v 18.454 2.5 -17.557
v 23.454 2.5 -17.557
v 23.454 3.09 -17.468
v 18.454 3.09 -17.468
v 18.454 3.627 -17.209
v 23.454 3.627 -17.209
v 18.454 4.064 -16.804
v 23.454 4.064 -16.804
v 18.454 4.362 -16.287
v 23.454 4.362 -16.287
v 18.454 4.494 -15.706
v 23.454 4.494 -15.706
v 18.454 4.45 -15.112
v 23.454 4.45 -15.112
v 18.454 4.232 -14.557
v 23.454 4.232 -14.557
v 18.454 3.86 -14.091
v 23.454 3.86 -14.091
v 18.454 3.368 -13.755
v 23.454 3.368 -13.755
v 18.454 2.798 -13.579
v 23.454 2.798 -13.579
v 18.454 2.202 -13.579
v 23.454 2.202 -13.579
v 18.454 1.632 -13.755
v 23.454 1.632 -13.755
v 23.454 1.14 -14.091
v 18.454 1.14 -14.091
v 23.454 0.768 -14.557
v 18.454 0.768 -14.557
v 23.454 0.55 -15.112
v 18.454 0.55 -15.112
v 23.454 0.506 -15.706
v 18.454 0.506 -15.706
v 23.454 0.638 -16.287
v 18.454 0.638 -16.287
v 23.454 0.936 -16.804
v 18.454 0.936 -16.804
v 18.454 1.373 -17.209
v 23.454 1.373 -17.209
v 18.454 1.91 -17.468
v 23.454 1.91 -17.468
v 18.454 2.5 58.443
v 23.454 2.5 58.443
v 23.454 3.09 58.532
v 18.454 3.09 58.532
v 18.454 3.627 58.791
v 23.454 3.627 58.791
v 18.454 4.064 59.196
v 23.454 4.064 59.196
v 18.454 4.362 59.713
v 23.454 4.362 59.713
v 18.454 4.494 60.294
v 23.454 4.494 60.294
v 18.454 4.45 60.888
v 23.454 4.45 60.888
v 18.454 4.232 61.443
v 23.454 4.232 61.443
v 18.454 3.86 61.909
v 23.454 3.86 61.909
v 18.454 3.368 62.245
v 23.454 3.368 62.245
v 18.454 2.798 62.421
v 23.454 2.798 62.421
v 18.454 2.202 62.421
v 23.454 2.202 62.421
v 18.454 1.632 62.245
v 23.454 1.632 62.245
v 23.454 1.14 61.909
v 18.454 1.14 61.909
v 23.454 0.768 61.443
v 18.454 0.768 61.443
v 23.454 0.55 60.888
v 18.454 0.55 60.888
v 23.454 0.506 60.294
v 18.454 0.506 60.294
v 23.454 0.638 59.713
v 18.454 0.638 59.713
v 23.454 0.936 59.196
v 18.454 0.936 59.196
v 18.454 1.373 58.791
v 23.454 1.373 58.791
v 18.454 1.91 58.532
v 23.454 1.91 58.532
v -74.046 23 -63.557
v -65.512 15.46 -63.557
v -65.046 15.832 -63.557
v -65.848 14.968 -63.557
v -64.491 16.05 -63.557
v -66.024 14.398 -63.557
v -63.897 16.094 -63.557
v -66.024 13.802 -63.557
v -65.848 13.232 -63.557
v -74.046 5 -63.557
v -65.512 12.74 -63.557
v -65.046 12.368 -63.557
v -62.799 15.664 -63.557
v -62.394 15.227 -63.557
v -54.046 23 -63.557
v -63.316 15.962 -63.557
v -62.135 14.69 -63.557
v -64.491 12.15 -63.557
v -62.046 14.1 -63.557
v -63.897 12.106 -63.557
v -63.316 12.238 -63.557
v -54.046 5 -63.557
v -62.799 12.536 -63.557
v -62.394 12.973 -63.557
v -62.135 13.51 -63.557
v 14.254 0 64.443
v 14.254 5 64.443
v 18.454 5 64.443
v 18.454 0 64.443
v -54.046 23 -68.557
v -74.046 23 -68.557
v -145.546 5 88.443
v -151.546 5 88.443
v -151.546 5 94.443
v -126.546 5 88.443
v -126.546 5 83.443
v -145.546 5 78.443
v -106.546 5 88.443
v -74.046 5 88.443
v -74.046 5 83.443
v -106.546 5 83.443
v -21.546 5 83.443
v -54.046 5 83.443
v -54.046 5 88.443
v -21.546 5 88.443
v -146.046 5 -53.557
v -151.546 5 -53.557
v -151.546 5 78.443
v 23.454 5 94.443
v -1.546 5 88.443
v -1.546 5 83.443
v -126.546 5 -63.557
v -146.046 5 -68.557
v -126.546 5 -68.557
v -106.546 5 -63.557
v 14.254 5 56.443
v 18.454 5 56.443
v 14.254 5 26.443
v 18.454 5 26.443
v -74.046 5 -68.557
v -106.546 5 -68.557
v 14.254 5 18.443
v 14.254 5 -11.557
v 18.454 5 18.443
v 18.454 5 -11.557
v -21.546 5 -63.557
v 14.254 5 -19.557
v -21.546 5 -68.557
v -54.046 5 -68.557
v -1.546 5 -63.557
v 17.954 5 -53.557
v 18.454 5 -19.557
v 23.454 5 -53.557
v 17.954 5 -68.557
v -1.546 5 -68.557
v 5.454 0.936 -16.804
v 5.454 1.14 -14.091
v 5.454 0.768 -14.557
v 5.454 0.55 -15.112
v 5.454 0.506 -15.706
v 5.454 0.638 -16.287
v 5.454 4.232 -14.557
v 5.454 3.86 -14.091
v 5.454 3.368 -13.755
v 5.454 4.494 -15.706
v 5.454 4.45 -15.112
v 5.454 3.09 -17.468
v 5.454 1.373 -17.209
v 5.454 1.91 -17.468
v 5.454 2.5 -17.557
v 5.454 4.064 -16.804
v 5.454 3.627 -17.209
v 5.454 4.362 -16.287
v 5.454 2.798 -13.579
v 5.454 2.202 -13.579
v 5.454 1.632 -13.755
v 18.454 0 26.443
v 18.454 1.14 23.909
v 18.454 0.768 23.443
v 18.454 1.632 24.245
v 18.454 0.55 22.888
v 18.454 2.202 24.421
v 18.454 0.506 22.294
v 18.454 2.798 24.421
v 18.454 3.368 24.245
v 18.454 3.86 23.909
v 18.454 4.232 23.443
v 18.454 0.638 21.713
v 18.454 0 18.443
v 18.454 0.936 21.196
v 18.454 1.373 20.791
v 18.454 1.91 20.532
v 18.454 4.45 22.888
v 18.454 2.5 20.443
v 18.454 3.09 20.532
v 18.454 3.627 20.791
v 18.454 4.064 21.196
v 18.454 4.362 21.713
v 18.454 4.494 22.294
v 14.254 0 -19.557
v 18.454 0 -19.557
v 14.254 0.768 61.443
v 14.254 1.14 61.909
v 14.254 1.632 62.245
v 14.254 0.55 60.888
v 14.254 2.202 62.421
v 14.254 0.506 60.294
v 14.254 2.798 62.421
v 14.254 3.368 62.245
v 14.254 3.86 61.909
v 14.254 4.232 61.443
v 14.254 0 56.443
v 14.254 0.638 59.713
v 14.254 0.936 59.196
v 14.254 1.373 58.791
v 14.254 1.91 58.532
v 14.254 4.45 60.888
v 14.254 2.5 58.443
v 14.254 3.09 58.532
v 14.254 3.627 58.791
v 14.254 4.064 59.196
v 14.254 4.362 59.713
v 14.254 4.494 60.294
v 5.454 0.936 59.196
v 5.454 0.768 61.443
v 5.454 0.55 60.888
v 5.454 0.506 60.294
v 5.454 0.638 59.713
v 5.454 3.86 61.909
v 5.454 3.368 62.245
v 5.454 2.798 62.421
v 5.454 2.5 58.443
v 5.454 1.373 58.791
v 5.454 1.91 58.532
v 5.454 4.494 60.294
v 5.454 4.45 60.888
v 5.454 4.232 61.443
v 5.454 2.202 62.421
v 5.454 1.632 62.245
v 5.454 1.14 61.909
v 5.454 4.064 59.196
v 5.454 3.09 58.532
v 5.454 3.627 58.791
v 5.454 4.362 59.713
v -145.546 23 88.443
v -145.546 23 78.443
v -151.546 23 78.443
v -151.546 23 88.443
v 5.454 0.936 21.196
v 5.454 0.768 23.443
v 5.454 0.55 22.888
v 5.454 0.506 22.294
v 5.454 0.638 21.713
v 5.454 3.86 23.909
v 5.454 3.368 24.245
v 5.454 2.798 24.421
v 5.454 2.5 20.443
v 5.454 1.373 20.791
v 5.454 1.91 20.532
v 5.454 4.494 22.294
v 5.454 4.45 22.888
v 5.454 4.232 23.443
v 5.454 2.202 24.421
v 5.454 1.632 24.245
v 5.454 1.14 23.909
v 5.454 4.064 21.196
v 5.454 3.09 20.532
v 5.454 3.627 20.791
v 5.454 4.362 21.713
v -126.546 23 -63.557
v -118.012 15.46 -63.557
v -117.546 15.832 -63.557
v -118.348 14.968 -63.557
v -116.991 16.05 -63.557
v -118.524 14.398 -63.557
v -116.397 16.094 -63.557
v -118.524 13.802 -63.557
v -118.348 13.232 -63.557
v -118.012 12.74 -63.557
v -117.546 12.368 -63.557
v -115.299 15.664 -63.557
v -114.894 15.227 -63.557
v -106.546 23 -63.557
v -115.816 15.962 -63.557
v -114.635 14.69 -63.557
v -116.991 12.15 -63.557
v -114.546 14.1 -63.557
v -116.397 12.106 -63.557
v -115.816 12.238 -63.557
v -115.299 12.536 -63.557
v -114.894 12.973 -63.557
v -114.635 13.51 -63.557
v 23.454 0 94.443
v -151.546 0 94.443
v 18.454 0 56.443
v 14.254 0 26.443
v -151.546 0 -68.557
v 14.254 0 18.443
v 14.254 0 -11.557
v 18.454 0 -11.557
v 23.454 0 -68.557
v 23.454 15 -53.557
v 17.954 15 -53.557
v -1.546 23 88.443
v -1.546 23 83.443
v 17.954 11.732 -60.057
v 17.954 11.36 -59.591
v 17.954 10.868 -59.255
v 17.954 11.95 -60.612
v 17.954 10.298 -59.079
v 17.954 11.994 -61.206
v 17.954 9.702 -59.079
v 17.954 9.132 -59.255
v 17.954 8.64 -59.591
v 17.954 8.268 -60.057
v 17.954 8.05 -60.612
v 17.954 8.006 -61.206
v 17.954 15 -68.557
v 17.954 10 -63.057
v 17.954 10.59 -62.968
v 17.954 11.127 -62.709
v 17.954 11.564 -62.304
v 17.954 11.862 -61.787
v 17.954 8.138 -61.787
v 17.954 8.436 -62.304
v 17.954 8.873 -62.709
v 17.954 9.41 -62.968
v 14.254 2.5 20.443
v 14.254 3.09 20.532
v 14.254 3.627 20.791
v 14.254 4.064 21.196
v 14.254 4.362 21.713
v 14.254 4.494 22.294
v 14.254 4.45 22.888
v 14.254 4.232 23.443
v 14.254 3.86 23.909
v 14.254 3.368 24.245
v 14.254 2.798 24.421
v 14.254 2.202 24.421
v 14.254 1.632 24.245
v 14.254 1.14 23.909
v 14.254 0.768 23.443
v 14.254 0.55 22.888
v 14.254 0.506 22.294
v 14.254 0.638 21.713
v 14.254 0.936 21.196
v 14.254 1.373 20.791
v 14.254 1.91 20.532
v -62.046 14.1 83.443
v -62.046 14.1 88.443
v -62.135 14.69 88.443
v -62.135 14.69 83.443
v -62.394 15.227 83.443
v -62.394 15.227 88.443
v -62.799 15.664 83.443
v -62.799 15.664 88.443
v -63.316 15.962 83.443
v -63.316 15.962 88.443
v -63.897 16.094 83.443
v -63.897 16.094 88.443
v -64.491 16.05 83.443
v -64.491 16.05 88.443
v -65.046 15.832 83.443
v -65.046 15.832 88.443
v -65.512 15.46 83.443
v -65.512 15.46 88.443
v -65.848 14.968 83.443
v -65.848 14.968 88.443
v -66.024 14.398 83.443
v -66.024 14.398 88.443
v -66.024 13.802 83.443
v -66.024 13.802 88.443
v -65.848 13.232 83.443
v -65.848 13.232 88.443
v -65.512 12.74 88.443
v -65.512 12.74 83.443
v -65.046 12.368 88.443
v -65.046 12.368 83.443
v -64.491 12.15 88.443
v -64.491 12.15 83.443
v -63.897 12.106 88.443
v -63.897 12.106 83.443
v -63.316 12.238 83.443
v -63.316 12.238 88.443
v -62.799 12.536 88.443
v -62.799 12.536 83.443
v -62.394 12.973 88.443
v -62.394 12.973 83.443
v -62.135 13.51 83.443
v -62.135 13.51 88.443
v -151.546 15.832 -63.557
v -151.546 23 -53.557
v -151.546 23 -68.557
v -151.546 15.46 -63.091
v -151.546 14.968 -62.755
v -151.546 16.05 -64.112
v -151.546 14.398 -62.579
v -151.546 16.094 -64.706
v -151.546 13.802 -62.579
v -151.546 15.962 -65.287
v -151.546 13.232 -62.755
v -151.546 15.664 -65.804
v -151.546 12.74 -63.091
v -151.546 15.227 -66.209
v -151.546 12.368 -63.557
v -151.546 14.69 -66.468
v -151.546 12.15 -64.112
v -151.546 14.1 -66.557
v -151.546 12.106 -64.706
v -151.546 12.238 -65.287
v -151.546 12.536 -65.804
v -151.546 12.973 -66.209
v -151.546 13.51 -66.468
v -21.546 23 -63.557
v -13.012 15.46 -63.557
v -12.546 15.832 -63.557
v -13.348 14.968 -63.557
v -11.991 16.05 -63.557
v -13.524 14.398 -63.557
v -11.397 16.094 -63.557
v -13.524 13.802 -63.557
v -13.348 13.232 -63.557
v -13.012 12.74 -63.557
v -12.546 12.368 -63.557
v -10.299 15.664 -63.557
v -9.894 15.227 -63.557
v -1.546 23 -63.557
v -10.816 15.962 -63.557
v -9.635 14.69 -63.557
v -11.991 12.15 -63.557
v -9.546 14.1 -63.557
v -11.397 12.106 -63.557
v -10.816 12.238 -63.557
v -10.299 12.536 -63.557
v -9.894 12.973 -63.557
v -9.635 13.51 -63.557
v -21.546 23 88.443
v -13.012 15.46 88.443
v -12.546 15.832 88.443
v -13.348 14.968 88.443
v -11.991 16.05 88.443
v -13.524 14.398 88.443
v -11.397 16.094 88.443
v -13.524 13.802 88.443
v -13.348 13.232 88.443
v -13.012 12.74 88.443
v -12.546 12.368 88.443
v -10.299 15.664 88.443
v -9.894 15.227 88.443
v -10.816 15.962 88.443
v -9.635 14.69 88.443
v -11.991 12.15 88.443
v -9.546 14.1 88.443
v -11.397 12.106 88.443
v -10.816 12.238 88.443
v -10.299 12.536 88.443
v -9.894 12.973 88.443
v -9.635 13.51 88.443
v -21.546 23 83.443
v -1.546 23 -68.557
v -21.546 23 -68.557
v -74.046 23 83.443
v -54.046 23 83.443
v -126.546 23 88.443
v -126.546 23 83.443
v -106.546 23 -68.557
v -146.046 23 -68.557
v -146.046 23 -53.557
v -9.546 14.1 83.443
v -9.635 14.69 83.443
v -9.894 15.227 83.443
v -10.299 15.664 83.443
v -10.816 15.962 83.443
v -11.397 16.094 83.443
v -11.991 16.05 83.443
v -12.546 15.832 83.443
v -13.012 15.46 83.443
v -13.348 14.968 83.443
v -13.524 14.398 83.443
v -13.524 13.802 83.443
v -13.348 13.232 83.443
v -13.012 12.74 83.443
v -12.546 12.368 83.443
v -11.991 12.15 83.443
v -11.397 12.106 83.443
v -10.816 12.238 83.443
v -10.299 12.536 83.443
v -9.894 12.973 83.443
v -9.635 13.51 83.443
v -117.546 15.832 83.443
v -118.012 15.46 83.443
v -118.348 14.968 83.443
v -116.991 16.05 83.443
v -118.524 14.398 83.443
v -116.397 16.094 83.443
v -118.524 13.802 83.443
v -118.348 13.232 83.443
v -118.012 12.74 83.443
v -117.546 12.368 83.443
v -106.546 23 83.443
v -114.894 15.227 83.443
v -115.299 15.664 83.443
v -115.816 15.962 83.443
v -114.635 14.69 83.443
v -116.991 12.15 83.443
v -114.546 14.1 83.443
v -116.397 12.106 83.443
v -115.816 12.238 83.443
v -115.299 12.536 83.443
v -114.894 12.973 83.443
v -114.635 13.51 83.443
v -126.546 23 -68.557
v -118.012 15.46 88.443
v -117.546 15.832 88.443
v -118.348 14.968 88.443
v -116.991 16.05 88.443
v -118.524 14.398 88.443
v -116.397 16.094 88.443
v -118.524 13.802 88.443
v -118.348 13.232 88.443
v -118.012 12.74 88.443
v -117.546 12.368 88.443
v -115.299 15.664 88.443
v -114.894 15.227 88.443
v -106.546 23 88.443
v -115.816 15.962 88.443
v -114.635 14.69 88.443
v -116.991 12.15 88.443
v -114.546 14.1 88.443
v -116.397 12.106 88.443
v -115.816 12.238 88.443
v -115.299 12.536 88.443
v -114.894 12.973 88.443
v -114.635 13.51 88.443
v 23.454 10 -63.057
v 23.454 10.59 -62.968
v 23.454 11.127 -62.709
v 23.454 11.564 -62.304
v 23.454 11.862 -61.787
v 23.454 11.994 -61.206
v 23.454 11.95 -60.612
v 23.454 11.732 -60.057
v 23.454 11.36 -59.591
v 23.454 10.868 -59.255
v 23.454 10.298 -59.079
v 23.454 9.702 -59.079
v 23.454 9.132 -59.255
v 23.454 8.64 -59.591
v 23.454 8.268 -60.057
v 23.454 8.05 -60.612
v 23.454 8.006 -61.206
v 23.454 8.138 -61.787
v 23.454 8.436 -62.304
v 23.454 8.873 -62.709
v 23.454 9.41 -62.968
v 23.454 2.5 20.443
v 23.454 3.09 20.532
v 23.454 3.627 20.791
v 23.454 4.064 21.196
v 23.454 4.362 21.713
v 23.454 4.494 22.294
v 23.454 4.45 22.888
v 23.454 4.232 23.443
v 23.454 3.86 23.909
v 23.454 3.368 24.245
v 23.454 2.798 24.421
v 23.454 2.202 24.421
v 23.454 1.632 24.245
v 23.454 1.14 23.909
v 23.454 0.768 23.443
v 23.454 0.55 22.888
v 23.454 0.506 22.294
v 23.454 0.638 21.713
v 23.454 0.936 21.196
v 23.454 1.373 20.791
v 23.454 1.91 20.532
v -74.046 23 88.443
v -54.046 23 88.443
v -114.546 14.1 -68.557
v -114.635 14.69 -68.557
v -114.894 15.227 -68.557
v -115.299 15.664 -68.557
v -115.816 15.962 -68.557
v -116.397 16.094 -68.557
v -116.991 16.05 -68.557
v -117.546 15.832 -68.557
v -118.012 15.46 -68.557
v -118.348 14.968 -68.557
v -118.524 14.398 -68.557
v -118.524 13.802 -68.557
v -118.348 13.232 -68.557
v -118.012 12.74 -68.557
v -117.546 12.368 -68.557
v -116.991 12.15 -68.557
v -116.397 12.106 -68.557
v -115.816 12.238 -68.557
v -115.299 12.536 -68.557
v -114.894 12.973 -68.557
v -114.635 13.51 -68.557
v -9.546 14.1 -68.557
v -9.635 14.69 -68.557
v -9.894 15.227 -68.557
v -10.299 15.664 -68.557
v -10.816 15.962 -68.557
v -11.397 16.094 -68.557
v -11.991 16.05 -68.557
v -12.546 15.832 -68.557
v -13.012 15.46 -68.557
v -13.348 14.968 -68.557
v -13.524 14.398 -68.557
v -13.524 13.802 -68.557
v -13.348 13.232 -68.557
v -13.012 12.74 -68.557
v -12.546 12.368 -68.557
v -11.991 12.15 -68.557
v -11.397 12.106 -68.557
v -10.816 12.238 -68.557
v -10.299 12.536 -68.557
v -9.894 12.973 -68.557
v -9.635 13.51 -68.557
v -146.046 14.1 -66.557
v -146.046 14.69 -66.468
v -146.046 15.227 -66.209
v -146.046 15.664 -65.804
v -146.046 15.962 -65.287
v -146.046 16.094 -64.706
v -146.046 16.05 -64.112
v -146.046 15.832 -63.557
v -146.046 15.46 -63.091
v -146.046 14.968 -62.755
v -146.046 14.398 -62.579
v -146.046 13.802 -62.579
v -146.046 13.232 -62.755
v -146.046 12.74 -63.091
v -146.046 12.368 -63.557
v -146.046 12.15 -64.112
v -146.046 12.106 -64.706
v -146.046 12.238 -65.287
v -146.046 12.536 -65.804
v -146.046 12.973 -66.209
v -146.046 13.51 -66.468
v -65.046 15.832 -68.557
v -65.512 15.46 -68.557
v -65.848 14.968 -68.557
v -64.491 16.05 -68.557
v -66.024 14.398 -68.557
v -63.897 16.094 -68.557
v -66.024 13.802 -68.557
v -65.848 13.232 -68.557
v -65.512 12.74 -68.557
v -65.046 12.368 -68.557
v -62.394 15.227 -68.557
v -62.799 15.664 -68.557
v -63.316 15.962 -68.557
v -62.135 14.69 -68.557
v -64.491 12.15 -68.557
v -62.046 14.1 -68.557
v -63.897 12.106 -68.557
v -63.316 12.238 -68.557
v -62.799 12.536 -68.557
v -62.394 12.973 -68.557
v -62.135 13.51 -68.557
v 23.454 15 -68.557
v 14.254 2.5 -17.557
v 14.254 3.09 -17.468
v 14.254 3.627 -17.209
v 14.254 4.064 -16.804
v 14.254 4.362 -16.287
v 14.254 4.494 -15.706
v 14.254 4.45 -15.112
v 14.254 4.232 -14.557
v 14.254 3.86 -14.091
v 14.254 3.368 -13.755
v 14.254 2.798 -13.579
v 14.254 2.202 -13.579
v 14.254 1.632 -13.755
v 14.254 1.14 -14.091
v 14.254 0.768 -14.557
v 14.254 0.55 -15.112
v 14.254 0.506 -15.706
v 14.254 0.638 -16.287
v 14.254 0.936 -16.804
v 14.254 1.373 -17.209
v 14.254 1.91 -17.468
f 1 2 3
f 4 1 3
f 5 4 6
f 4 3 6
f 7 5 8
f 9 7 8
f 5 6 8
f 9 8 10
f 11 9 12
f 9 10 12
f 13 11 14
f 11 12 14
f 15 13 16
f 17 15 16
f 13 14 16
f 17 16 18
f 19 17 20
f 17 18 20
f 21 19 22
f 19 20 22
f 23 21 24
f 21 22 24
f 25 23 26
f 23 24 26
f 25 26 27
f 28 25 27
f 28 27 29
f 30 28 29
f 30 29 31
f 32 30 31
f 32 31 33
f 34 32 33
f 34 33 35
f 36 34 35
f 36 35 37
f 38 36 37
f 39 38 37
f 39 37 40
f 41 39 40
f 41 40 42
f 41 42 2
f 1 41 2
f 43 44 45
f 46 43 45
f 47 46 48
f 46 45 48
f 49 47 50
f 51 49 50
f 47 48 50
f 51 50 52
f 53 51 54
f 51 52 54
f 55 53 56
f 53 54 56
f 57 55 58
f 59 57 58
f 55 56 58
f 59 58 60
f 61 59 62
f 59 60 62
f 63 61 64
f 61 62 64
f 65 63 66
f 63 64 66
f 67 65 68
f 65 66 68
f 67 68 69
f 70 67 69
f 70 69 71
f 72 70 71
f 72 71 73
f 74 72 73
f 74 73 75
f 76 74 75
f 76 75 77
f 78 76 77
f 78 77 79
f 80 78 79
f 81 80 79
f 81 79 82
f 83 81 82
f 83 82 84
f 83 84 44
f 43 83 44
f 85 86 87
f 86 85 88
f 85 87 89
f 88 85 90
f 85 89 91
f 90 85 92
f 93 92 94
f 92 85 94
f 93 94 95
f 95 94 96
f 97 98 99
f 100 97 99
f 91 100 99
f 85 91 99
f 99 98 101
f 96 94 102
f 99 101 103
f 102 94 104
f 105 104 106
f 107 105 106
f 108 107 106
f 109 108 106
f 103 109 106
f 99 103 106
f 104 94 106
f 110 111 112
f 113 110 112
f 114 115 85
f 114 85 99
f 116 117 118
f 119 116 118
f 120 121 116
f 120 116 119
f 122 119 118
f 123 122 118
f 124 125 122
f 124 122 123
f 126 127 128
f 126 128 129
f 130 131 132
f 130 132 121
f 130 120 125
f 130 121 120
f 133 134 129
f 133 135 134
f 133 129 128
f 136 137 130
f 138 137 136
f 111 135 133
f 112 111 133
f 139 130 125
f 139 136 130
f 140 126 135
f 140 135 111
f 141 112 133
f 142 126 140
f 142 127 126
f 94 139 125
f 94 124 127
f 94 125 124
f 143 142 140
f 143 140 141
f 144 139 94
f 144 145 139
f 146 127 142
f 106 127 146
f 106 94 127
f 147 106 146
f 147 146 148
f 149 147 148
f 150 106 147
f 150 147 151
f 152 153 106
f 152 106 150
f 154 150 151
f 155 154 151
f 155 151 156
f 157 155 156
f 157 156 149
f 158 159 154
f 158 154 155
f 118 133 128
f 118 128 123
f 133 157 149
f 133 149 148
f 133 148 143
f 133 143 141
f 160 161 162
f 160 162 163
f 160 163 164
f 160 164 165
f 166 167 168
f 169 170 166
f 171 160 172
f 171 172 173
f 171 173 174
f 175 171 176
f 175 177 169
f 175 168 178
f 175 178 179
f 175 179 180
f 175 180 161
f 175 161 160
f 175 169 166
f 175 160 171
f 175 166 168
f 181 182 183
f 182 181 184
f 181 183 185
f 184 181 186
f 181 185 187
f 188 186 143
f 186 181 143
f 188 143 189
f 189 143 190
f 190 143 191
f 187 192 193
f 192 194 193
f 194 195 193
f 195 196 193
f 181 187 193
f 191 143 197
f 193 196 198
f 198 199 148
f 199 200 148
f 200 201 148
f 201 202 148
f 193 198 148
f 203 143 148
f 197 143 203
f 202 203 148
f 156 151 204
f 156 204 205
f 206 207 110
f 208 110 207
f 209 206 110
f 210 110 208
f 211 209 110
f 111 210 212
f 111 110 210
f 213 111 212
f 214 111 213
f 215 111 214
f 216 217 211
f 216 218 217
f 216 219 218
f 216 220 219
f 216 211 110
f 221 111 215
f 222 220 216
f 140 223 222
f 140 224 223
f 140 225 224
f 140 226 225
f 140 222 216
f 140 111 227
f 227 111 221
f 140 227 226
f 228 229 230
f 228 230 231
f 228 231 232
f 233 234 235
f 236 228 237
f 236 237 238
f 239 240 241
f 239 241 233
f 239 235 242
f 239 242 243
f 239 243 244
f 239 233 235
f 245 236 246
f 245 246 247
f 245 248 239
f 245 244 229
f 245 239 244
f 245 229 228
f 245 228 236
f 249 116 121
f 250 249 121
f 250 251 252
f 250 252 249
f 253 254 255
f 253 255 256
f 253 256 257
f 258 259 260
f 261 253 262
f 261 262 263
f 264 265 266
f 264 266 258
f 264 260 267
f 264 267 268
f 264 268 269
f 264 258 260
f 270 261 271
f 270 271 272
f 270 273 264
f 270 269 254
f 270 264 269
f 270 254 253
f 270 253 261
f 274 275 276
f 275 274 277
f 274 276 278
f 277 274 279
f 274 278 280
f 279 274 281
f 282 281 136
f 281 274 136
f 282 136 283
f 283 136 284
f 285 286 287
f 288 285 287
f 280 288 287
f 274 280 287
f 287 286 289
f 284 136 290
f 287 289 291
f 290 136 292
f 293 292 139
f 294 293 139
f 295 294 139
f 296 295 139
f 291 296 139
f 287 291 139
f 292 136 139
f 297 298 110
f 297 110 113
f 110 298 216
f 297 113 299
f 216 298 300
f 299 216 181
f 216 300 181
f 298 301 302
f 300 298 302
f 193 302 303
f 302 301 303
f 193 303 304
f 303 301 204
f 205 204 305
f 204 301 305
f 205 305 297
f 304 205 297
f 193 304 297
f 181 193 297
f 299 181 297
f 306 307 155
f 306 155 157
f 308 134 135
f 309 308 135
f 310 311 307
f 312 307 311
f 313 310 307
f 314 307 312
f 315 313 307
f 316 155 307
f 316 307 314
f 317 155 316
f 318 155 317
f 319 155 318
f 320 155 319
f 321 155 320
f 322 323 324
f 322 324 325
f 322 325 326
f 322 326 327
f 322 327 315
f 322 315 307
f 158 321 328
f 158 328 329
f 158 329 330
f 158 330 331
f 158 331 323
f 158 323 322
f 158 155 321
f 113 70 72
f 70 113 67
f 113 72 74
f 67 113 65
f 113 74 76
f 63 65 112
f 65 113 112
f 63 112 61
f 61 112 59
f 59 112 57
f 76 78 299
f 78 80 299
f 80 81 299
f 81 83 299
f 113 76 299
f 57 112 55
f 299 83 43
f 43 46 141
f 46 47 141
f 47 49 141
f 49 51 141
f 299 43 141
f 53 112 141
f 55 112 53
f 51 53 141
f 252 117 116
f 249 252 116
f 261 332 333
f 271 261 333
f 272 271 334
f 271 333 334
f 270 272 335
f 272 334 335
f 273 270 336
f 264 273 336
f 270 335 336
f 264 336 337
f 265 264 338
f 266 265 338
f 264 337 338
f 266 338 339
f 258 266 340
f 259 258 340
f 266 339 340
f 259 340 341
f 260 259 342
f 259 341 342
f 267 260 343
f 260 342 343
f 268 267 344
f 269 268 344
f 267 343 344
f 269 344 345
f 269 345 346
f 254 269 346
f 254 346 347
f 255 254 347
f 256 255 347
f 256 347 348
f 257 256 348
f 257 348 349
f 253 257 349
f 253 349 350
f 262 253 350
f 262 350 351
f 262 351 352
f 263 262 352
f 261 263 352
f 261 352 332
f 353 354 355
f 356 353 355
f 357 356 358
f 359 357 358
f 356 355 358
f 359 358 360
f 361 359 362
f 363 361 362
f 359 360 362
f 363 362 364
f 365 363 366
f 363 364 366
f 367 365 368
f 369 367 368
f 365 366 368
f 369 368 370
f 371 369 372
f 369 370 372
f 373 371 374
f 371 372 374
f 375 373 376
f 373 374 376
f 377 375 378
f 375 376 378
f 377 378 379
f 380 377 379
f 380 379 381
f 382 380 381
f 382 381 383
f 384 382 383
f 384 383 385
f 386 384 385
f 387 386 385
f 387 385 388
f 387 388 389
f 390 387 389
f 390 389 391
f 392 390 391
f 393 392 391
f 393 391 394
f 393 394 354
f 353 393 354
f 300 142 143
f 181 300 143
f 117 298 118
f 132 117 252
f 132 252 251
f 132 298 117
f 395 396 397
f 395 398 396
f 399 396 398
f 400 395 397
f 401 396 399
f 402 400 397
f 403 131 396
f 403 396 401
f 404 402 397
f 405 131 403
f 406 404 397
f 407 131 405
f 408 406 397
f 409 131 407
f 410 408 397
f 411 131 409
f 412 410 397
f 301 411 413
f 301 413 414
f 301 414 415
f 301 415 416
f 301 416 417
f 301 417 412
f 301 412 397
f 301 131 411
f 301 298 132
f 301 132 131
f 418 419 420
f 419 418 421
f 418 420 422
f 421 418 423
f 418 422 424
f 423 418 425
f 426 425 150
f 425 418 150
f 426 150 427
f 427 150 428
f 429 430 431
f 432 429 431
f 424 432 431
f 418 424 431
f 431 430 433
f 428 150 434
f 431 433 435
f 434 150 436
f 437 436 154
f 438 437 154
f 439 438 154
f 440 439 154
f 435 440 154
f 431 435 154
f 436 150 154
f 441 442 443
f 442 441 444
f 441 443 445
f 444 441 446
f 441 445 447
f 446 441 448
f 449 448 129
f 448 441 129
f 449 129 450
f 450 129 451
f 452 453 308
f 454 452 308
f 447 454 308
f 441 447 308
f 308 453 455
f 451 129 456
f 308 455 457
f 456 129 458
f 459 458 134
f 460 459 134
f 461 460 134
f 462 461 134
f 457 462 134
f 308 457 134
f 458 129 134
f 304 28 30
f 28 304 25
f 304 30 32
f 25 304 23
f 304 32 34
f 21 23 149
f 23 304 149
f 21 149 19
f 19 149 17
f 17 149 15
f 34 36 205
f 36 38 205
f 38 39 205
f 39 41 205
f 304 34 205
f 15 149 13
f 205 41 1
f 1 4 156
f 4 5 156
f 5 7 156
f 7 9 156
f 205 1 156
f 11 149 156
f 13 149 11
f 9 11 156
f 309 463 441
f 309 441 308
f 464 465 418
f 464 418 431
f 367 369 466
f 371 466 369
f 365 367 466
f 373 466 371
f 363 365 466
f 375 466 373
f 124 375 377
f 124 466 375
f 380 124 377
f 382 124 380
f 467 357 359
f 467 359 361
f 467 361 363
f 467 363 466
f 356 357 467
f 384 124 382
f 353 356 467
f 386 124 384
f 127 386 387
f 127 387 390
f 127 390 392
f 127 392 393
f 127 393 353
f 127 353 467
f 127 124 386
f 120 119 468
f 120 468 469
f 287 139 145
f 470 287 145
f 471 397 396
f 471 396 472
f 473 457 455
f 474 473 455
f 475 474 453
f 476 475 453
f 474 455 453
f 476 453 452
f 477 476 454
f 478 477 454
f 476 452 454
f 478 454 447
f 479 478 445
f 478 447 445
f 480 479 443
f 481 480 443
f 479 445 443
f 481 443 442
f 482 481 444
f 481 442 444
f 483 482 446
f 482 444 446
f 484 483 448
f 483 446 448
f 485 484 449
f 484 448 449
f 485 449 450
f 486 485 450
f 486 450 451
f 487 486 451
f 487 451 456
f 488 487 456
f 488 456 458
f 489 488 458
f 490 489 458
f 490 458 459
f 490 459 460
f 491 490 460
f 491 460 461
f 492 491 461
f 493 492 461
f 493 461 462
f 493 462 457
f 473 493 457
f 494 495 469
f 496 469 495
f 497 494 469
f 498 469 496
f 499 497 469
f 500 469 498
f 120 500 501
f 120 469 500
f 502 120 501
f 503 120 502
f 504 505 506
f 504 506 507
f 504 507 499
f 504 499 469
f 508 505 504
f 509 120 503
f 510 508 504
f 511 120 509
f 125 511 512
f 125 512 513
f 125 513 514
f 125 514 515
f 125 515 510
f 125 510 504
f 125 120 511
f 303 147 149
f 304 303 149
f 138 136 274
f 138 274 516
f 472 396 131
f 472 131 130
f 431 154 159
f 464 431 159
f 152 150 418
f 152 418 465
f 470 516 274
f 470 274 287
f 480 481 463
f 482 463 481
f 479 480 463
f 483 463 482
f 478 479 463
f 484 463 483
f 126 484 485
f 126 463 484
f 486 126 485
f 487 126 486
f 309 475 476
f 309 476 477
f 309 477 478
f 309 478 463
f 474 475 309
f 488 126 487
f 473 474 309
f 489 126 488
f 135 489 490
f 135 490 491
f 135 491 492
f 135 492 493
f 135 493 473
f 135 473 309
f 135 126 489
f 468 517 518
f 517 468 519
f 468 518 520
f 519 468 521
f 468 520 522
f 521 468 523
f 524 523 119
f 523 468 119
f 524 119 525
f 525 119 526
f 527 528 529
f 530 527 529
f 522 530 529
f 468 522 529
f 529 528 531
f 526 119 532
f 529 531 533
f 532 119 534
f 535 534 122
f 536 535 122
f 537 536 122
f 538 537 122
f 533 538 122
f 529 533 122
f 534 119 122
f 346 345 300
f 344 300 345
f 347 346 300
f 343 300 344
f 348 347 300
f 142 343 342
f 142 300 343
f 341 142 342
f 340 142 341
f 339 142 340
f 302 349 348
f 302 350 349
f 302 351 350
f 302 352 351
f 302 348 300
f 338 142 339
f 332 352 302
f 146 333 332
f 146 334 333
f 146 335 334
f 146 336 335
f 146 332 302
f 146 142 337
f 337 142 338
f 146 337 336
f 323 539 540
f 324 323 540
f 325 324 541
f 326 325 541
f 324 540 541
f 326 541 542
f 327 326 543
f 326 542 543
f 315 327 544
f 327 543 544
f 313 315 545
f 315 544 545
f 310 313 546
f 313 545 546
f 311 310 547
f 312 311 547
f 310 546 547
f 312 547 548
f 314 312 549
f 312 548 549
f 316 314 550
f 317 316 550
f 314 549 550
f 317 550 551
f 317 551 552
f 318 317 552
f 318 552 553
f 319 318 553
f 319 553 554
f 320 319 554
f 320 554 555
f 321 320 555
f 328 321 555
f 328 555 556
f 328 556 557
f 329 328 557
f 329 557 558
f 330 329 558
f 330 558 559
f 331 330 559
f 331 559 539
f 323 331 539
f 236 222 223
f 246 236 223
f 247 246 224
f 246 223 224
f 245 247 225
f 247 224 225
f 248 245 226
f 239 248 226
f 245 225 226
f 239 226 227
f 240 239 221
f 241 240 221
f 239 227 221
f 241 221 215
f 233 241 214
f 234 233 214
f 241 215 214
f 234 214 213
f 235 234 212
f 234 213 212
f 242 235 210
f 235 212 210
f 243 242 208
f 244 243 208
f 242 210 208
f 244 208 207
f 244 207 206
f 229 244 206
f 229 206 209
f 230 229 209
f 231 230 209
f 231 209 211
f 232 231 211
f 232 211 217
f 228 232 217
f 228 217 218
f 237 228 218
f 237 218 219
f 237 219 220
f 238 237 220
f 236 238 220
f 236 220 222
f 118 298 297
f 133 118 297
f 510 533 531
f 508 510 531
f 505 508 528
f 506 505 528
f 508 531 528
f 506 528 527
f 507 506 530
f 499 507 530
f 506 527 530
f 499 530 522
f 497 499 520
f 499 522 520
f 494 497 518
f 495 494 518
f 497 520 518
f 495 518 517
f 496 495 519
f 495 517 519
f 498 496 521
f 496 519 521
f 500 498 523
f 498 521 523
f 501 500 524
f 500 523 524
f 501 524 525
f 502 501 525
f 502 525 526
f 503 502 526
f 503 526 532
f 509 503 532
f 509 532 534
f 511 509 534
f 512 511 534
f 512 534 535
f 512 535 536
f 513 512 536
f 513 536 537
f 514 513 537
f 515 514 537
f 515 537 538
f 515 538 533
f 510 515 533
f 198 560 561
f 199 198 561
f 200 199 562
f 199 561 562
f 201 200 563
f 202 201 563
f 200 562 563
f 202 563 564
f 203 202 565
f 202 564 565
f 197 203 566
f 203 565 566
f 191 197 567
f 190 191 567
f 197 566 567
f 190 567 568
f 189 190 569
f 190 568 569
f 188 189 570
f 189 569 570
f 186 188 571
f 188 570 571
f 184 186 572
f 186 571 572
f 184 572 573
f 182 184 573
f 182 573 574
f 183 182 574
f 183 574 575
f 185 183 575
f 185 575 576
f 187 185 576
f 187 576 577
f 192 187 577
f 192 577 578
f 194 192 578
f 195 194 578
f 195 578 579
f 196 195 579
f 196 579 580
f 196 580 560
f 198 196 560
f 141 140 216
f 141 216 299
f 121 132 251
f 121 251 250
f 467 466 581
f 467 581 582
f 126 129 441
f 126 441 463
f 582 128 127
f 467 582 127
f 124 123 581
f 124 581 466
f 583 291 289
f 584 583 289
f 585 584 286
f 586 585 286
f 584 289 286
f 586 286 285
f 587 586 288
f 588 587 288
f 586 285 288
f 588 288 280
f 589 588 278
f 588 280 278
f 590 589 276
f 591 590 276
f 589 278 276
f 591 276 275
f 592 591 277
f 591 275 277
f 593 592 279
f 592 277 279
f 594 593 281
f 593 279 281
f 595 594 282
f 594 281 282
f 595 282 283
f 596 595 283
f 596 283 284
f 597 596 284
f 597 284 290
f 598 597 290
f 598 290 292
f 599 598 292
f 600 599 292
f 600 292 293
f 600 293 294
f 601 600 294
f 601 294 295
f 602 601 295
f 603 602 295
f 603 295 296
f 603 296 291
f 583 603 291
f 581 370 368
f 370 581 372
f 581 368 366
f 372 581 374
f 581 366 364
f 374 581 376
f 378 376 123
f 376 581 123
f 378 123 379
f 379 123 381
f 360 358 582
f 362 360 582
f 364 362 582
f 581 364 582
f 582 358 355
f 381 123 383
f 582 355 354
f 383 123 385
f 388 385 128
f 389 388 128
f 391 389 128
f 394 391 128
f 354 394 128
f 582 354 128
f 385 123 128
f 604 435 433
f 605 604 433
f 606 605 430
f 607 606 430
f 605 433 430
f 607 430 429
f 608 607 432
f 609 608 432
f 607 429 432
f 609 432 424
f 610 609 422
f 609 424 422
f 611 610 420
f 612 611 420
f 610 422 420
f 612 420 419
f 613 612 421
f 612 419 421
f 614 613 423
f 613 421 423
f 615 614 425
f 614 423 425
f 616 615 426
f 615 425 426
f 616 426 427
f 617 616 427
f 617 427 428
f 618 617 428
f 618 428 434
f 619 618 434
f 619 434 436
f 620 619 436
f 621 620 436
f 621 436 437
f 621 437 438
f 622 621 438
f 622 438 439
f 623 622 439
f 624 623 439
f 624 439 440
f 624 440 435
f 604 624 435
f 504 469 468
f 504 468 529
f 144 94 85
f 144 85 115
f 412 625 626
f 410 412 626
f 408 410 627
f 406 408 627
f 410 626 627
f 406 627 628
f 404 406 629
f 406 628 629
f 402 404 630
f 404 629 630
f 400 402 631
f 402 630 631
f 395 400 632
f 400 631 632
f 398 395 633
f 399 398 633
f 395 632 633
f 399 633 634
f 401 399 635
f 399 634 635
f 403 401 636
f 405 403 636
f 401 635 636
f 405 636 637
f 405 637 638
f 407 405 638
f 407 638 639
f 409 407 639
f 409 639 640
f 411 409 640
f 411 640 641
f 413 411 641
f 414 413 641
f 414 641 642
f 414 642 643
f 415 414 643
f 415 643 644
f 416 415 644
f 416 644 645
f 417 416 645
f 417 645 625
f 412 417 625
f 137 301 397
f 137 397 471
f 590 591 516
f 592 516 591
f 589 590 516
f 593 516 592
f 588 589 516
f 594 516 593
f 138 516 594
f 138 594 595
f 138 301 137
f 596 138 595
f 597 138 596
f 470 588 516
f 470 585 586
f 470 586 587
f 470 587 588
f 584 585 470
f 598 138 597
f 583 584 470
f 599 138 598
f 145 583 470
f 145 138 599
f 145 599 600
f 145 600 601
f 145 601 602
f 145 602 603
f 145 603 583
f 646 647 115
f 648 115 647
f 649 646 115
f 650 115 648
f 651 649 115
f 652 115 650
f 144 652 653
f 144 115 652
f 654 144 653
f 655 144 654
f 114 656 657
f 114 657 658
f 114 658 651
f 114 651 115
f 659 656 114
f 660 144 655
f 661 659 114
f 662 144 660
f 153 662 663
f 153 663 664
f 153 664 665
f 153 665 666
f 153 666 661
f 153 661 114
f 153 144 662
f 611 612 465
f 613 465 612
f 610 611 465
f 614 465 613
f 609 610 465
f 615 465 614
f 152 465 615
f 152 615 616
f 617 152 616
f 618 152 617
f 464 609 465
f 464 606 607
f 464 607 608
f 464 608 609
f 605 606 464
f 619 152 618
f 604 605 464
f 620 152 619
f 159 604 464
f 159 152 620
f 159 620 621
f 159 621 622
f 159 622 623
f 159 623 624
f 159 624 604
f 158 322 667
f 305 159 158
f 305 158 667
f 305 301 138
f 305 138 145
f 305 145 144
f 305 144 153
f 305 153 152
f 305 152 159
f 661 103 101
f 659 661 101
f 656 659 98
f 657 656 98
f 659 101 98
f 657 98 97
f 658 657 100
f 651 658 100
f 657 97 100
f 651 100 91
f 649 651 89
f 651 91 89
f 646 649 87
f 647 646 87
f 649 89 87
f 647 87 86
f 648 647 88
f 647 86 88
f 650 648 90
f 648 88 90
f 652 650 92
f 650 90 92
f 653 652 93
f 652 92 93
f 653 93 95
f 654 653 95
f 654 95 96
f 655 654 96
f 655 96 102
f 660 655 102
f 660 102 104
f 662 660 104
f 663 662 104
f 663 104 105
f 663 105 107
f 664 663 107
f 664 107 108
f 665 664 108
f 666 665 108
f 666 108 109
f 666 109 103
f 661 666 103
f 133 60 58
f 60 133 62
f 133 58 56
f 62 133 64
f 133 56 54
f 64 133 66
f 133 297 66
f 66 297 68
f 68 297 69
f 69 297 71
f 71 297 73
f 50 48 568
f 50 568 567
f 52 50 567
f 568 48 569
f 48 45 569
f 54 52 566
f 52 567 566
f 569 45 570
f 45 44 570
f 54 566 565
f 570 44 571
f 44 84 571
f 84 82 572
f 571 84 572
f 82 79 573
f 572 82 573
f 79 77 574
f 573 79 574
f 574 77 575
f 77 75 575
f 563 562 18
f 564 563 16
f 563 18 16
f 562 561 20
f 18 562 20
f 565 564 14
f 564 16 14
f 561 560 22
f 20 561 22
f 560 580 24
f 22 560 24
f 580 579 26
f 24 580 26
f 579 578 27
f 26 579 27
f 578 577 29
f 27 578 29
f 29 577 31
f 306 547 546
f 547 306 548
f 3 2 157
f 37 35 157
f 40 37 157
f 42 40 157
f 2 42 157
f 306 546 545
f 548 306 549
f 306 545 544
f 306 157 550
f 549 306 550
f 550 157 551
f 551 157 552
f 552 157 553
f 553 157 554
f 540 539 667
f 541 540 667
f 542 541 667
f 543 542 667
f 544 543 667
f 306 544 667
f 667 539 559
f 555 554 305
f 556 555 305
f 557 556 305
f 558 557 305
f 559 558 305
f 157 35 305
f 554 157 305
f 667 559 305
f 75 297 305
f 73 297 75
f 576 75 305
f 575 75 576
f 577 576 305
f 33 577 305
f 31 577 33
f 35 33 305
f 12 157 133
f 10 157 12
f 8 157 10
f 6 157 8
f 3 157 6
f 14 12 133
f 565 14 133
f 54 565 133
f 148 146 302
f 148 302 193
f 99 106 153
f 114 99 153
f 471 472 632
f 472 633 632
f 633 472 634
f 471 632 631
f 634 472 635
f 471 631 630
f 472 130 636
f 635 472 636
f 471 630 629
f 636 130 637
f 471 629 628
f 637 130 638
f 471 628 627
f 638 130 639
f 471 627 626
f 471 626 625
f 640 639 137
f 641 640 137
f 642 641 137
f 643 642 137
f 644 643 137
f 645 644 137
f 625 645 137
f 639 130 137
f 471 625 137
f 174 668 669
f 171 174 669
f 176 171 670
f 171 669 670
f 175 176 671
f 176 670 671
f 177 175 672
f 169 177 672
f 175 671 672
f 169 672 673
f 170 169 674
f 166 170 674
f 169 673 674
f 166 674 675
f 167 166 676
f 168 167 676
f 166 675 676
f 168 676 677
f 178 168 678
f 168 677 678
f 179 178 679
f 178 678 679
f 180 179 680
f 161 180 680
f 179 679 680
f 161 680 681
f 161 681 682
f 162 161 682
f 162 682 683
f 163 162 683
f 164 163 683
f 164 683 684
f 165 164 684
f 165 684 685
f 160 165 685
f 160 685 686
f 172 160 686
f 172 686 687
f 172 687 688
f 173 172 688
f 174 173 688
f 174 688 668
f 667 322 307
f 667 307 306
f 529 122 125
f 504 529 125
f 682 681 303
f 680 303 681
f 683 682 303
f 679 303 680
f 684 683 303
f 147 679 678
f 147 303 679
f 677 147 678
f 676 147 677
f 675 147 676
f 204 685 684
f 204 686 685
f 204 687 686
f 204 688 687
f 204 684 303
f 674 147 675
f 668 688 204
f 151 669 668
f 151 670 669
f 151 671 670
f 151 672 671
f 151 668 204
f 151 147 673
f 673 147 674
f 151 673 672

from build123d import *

# Parameters (mm, degrees)
SKETCH1_W               = 175
SKETCH1_H               = 163
BOSS_EXTRUDE1_DEPTH     = 5
SKETCH2_W               = 20
SKETCH2_H               = 5
BOSS_EXTRUDE2_DEPTH     = 18
SKETCH3_R               = 2
CUT_EXTRUDE1_DEPTH      = 7
CUT_EXTRUDE1_DEPTH_BACK = 158
SKETCH4_W               = 5.5
SKETCH4_H               = 15
SKETCH4_W_2             = 6
SKETCH4_H_2             = 10
BOSS_EXTRUDE3_DEPTH     = 18
SKETCH5_R               = 2
CUT_EXTRUDE2_DEPTH      = 18
SKETCH6_W               = 5.5
SKETCH6_H               = 15
BOSS_EXTRUDE4_DEPTH     = 10
SKETCH7_R               = 2
CUT_EXTRUDE3_DEPTH      = 10
SKETCH8_W               = 4.2
SKETCH8_H               = 8
CUT_EXTRUDE4_DEPTH      = 10
SKETCH9_R               = 2
CUT_EXTRUDE5_DEPTH      = 18


with BuildPart() as part:
    # Sketch1 → Boss-Extrude1 (new body)
    with BuildSketch(Plane(origin=(0, 0, 0), x_dir=(1, 0, 0), z_dir=(0, 1, 0))):
        with Locations((-64.046391753, -12.943298969)):
            Rectangle(SKETCH1_W, SKETCH1_H)
    extrude(amount=BOSS_EXTRUDE1_DEPTH)

    # Sketch2 → Boss-Extrude2 (add)
    with BuildSketch(Plane(origin=(0, 5, 0), x_dir=(1, 0, 0), z_dir=(0, 1, 0))):
        with Locations((-116.546391753, 66.056701031)):
            Rectangle(SKETCH2_W, SKETCH2_H)
        with Locations((-116.546391753, -85.943298969)):
            Rectangle(SKETCH2_W, SKETCH2_H)
        with Locations((-11.546391753, -85.943298969)):
            Rectangle(SKETCH2_W, SKETCH2_H)
        with Locations((-11.546391753, 66.056701031)):
            Rectangle(SKETCH2_W, SKETCH2_H)
        with Locations((-64.046391753, -85.943298969)):
            Rectangle(SKETCH2_W, SKETCH2_H)
        with Locations((-64.046391753, 66.056701031)):
            Rectangle(SKETCH2_W, SKETCH2_H)
    extrude(amount=BOSS_EXTRUDE2_DEPTH)

    # Sketch3 → Cut-Extrude1 (cut, two sides)
    with BuildSketch(Plane.XY.offset(88.443298969)) as cut_extrude1_sk:
        with Locations((-116.546391753, 14.1)):
            Circle(SKETCH3_R)
        with Locations((-64.046391753, 14.1)):
            Circle(SKETCH3_R)
        with Locations((-11.546391753, 14.1)):
            Circle(SKETCH3_R)
    extrude(amount=CUT_EXTRUDE1_DEPTH, mode=Mode.SUBTRACT)
    extrude(cut_extrude1_sk.sketch, amount=-CUT_EXTRUDE1_DEPTH_BACK, mode=Mode.SUBTRACT)

    # Sketch4 → Boss-Extrude3 (add)
    with BuildSketch(Plane(origin=(0, 5, 0), x_dir=(1, 0, 0), z_dir=(0, 1, 0))):
        with Locations((-148.796391753, 61.056701031)):
            Rectangle(SKETCH4_W, SKETCH4_H)
        with Locations((-148.546391753, -83.443298969)):
            Rectangle(SKETCH4_W_2, SKETCH4_H_2)
    extrude(amount=BOSS_EXTRUDE3_DEPTH)

    # Sketch5 → Cut-Extrude2 (cut)
    with BuildSketch(Plane(origin=(-146.046391753, 0, 0), x_dir=(0, 0, -1), z_dir=(1, 0, 0))):
        with Locations((64.556701031, 14.1)):
            Circle(SKETCH5_R)
    extrude(amount=-CUT_EXTRUDE2_DEPTH, mode=Mode.SUBTRACT)

    # Sketch6 → Boss-Extrude4 (add)
    with BuildSketch(Plane(origin=(0, 5, 0), x_dir=(1, 0, 0), z_dir=(0, 1, 0))):
        with Locations((20.703608247, 61.056701031)):
            Rectangle(SKETCH6_W, SKETCH6_H)
    extrude(amount=BOSS_EXTRUDE4_DEPTH)

    # Sketch7 → Cut-Extrude3 (cut)
    with BuildSketch(Plane(origin=(23.453608247, 0, 0), x_dir=(0, 0, -1), z_dir=(1, 0, 0))):
        with Locations((61.056701031, 10)):
            Circle(SKETCH7_R)
    extrude(amount=-CUT_EXTRUDE3_DEPTH, mode=Mode.SUBTRACT)

    # Sketch8 → Cut-Extrude4 (cut)
    with BuildSketch(Plane(origin=(0, 5, 0), x_dir=(1, 0, 0), z_dir=(0, 1, 0))):
        with Locations((16.353608247, -60.443298969)):
            Rectangle(SKETCH8_W, SKETCH8_H)
        with Locations((16.353608247, -22.443298969)):
            Rectangle(SKETCH8_W, SKETCH8_H)
        with Locations((16.353608247, 15.556701031)):
            Rectangle(SKETCH8_W, SKETCH8_H)
    extrude(amount=-CUT_EXTRUDE4_DEPTH, mode=Mode.SUBTRACT)

    # Sketch9 → Cut-Extrude5 (cut)
    with BuildSketch(Plane(origin=(23.453608247, 0, 0), x_dir=(0, 0, -1), z_dir=(1, 0, 0))):
        with Locations((-60.443298969, 2.5)):
            Circle(SKETCH9_R)
        with Locations((15.556701031, 2.5)):
            Circle(SKETCH9_R)
        with Locations((-22.443298969, 2.5)):
            Circle(SKETCH9_R)
    extrude(amount=-CUT_EXTRUDE5_DEPTH, mode=Mode.SUBTRACT)


solid = part.part
